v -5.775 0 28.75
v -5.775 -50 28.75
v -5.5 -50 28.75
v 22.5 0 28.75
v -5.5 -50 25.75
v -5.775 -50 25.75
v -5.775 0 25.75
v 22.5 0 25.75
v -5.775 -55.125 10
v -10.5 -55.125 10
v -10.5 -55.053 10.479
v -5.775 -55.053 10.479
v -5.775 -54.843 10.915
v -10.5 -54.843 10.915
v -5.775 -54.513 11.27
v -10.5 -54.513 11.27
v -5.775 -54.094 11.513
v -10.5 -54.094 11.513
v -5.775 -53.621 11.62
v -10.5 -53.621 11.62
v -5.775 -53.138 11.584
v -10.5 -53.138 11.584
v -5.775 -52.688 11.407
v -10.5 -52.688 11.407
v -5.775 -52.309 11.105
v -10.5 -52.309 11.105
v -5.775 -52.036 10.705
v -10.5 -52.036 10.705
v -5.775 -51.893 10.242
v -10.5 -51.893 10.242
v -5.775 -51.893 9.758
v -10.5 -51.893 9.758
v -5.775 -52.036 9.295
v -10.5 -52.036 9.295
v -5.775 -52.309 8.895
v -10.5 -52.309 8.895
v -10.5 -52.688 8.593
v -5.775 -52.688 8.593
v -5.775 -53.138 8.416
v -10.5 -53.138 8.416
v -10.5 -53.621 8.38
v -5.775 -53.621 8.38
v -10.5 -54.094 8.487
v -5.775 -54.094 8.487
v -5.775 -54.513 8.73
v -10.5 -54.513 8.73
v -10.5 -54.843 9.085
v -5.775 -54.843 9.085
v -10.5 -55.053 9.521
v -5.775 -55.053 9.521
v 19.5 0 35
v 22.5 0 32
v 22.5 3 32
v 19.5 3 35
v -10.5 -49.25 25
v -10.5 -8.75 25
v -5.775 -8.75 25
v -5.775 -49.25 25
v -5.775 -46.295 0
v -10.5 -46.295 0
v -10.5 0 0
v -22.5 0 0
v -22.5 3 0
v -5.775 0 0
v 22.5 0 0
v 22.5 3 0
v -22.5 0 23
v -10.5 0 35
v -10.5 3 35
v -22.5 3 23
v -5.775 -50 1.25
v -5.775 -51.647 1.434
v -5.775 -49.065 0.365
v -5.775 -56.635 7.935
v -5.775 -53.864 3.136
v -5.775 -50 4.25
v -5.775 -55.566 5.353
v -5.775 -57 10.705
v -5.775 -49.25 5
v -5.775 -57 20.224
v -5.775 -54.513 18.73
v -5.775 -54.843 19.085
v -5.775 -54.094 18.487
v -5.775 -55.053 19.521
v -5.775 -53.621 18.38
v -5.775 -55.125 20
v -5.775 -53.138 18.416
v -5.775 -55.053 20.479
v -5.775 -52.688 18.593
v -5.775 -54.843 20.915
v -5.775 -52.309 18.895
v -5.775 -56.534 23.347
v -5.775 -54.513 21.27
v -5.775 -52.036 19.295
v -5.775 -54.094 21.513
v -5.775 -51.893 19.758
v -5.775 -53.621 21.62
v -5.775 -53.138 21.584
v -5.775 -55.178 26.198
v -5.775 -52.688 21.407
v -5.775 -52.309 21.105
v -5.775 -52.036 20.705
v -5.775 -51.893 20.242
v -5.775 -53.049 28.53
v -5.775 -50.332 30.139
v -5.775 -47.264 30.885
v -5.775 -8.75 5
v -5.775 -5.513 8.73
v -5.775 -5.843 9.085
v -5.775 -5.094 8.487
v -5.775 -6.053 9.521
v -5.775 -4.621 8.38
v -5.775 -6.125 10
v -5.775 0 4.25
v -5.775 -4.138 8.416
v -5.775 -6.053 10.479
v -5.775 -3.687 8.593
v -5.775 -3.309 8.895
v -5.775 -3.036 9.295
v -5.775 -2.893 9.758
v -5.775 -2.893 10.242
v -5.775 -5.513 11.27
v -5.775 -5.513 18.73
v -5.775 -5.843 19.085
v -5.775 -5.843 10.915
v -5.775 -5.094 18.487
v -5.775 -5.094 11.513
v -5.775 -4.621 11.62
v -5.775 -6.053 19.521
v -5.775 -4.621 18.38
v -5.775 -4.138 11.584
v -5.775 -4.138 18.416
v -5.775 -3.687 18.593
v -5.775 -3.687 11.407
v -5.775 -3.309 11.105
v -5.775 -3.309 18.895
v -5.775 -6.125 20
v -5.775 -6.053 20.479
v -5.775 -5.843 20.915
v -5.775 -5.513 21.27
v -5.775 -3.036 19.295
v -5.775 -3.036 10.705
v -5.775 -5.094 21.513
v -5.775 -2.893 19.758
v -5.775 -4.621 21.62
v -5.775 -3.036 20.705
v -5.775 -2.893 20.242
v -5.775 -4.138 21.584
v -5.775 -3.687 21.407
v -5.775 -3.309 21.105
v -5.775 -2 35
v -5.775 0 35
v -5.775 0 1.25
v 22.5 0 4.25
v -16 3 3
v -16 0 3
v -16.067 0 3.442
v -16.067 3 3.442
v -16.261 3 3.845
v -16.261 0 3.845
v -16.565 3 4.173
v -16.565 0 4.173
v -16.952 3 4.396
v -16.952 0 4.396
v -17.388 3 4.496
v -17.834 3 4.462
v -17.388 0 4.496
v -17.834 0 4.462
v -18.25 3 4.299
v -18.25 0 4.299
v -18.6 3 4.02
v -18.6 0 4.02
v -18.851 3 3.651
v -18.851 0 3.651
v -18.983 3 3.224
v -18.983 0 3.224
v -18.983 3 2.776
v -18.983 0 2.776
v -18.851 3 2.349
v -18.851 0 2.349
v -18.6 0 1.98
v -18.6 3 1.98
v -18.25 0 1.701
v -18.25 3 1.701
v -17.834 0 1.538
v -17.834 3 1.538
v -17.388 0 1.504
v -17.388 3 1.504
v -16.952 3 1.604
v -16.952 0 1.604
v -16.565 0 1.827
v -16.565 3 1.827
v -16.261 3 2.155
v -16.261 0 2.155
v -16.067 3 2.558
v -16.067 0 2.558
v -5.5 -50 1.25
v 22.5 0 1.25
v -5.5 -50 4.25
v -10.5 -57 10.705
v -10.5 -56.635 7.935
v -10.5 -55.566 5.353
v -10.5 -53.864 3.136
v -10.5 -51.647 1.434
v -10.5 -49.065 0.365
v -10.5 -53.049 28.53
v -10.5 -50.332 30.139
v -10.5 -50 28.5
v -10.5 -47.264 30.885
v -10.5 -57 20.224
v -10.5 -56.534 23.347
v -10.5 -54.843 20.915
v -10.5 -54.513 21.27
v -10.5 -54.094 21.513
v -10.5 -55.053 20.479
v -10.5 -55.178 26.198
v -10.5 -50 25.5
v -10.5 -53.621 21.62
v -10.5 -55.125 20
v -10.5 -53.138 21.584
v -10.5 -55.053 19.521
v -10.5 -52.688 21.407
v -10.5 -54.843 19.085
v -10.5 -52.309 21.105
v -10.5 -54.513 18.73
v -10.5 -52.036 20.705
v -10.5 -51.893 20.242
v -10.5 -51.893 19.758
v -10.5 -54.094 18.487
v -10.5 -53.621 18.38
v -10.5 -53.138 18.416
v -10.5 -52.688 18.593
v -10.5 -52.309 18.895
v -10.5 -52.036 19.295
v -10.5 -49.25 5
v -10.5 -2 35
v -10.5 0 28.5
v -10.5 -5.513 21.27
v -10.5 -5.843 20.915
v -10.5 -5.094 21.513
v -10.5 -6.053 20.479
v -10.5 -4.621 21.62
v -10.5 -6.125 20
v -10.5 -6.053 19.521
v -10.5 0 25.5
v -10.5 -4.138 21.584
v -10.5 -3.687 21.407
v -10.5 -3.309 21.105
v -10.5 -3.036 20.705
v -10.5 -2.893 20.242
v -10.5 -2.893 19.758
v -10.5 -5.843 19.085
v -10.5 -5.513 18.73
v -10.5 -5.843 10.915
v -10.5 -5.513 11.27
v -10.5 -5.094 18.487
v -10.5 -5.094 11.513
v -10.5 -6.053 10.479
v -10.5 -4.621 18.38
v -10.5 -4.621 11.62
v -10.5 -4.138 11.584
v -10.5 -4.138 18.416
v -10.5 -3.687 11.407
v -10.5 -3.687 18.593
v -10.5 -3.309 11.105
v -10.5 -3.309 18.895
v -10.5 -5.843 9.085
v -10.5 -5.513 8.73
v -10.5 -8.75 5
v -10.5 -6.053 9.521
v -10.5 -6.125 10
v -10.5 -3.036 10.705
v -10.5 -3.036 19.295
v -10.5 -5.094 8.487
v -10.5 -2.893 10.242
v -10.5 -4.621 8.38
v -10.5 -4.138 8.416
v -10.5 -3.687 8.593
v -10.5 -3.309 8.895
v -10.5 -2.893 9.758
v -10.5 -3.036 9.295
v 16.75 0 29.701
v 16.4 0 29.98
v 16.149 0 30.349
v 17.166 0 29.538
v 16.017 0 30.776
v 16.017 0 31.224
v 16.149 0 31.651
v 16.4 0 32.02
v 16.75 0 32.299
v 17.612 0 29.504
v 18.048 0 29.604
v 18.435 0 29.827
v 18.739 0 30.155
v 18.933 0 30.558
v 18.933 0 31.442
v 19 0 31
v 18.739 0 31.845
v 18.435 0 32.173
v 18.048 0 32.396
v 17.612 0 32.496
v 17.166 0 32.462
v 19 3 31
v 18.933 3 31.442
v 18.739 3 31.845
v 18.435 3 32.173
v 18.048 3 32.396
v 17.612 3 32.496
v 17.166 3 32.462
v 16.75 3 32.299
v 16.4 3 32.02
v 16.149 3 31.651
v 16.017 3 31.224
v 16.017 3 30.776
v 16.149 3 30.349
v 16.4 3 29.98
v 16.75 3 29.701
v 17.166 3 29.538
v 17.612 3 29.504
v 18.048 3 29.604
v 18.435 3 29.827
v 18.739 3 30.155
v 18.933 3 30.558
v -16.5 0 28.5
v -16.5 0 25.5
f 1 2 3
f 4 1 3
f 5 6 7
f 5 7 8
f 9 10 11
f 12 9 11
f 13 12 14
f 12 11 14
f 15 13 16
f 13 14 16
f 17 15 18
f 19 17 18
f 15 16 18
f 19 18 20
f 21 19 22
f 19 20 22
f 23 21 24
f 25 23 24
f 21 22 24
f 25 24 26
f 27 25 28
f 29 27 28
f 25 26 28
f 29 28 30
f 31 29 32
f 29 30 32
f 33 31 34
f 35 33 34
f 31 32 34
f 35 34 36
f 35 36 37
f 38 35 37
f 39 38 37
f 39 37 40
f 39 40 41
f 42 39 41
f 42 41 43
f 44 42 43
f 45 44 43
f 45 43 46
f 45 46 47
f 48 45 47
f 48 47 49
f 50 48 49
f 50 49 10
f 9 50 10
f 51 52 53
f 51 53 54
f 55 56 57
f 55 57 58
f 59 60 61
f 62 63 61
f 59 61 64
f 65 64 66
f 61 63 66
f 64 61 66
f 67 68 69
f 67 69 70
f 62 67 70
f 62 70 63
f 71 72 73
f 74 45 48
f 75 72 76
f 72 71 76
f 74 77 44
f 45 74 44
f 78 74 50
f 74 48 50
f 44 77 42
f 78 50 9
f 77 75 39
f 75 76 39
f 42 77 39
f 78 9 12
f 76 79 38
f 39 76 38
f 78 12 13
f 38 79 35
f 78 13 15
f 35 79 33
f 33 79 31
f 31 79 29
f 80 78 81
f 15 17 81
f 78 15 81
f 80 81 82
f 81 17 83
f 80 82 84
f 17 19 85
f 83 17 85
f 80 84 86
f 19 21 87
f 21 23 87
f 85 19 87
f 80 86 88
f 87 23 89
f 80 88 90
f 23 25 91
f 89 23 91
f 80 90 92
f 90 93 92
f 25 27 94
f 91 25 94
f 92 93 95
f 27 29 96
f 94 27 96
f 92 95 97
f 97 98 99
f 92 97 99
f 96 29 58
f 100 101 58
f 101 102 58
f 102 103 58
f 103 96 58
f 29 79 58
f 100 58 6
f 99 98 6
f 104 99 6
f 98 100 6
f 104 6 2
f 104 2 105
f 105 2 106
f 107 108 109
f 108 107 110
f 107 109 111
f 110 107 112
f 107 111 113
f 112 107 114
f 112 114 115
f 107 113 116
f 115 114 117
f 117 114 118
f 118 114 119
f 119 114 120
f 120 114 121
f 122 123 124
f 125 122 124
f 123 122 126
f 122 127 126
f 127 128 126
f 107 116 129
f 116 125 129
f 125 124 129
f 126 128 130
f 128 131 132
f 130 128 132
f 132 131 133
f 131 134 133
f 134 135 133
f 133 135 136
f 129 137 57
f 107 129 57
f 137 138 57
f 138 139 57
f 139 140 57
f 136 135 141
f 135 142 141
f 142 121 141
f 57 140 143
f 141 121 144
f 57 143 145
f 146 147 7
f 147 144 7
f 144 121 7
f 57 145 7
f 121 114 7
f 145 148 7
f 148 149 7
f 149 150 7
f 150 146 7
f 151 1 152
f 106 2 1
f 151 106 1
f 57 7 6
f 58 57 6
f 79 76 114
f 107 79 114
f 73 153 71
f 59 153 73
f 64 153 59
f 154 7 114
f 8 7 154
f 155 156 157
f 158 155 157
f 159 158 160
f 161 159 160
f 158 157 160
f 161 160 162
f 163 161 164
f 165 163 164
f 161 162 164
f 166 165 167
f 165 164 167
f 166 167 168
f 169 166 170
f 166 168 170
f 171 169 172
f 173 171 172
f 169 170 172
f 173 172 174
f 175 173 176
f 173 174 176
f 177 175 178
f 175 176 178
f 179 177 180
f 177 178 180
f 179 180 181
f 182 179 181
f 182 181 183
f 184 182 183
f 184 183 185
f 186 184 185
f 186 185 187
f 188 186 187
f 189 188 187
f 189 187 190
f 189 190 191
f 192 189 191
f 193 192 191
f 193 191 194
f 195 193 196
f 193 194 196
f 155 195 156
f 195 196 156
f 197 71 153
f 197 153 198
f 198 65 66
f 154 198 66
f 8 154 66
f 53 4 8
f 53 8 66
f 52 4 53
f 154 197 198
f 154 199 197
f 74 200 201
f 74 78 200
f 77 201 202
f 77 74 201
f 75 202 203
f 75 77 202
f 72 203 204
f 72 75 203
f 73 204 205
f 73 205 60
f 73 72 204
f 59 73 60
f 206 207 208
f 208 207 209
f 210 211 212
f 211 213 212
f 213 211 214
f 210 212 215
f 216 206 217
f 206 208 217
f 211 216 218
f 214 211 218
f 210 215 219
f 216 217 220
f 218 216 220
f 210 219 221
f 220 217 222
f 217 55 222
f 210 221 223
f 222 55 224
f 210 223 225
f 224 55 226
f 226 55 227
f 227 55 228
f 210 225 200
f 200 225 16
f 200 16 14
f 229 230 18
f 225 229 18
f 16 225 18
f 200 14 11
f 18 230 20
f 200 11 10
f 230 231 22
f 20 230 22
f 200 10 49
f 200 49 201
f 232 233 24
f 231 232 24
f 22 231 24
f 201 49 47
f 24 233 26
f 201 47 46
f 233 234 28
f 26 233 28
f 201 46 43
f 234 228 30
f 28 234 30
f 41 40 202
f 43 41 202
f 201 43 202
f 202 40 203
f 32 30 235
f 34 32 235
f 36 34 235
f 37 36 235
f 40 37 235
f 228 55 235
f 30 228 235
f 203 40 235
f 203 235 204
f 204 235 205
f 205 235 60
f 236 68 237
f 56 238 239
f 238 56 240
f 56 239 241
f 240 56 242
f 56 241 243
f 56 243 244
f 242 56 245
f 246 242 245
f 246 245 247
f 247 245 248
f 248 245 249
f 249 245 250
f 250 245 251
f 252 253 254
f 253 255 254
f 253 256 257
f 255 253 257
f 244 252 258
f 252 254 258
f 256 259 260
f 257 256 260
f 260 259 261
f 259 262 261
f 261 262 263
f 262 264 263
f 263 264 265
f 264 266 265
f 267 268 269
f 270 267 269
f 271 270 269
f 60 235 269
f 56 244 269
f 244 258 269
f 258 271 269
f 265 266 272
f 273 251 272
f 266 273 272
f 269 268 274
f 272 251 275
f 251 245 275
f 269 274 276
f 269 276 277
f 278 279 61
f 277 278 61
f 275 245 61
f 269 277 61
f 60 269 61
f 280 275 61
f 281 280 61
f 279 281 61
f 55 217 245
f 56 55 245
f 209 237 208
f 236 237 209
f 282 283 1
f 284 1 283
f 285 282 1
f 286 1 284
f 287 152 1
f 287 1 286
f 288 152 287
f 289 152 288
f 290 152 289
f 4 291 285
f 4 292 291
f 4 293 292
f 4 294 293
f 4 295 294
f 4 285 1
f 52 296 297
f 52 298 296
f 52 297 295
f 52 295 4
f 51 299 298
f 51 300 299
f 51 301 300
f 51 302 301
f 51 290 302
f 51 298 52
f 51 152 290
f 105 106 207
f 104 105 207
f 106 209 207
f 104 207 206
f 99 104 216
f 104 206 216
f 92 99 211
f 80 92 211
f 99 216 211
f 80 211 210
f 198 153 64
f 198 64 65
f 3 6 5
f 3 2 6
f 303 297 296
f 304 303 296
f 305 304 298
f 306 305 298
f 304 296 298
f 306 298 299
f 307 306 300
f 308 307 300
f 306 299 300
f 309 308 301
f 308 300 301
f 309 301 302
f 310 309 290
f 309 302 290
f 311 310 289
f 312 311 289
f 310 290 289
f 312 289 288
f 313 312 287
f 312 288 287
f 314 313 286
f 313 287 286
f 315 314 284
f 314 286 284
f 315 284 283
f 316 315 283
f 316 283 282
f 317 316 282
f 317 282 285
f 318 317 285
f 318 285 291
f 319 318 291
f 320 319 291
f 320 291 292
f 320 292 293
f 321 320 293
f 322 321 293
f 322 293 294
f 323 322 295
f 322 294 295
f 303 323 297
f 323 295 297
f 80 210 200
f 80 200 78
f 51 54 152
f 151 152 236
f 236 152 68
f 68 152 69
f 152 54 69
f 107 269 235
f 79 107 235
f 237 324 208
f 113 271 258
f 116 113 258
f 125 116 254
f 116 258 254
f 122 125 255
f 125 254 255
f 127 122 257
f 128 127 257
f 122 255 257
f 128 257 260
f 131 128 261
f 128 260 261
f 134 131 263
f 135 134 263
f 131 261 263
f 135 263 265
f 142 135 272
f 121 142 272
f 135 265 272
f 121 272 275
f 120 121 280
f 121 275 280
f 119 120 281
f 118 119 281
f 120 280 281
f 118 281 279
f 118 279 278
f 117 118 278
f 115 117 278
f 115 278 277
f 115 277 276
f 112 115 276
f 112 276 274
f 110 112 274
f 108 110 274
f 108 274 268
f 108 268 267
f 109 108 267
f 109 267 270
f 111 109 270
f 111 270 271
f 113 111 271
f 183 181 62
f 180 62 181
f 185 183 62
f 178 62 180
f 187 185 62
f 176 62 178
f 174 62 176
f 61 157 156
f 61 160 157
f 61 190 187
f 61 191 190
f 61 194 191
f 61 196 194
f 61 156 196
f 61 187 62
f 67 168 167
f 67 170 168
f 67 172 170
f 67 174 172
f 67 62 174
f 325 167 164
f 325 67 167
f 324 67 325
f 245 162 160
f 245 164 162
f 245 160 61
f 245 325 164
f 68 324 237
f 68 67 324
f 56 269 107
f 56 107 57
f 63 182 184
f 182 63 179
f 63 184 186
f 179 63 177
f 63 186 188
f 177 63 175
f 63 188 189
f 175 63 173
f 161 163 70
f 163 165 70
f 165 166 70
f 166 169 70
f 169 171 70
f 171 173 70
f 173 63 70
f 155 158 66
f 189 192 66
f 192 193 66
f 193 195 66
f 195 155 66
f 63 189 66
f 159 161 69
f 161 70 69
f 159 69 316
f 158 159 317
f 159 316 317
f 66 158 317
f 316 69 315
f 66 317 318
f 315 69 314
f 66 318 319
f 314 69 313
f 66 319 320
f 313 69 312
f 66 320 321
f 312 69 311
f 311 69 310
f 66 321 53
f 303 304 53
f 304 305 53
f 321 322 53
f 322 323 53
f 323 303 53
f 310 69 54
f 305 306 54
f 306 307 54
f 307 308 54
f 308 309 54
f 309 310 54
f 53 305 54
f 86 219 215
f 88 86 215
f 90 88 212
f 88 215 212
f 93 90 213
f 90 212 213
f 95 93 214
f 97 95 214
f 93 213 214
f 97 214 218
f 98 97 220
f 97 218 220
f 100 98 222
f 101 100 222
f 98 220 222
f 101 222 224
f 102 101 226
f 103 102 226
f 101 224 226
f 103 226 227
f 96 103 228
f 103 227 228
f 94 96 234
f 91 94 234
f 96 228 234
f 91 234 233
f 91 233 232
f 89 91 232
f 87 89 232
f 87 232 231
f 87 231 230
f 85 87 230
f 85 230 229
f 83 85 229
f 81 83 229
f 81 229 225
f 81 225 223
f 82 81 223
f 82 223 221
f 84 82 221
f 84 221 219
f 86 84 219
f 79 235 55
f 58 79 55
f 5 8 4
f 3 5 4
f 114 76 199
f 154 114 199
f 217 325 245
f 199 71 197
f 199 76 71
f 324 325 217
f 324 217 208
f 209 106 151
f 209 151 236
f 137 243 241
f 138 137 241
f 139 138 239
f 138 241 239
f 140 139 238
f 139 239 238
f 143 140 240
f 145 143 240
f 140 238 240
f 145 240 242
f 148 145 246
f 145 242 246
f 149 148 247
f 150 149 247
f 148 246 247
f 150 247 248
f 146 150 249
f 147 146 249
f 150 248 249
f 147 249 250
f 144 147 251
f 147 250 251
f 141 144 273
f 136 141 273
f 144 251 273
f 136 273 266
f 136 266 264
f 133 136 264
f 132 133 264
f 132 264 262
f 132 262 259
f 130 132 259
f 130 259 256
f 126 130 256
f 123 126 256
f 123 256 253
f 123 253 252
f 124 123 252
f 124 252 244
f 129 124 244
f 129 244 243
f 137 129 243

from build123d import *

# Parameters (mm, degrees)
F0_R       = 1.5
F1_DEPTH   = 3
F3_DEPTH   = 57
F4_R       = 1.625
F4_W       = 40.5
F4_H       = 20
F5_DEPTH   = 33.001
F2_W       = 28.2747811079
F2_H       = 3
F6_DEPTH   = 50
F7_SIZE2   = 50
F7_SIZE    = 28
F7_2_SIZE2 = 50
F7_2_SIZE  = 28
F8_SIZE2   = 55
F8_SIZE    = 5
F9_R       = 10.70545329
F10_W      = 6
F10_H      = 3
F11_DEPTH  = 50
F12_SIZE2  = 49.99999
F12_SIZE   = 5.99999


# Not quite as in the source:
# - a fillet or chamfer is up to 0.001 mm smaller than in the source, because OpenCascade refuses the exact size


with BuildPart() as f1:
    # F0 (on Front) → F1 (new body)
    with BuildSketch(Plane.XZ):
        Polygon((-22.5, 23), (-22.5, 0), (22.5, 0), (22.5, 32), (19.5, 35), (-10.5, 35), align=None)
        with Locations((-17.5, 3)):
            Circle(F0_R, mode=Mode.SUBTRACT)
        with Locations((17.5, 31)):
            Circle(F0_R, mode=Mode.SUBTRACT)
    extrude(amount=-F1_DEPTH)

    # F2 (on face) → F3 (join)
    with BuildSketch(Plane.XZ):
        Polygon((-5.7747811079, 35), (-10.5, 35), (-10.5, 0), (-5.7747811079, 0), (-5.7747811079, 1.25), (-5.7747811079, 4.25), (-5.7747811079, 25.75), (-5.7747811079, 28.75), align=None)
    extrude(amount=F3_DEPTH)

    # F4 (on face) → F5 (cut, through all)
    with BuildSketch(Plane(origin=(-10.5, 0, 0), x_dir=(0, -1, 0), z_dir=(-1, 0, 0))):
        with Locations((4.5, 20)):
            Circle(F4_R)
        with Locations((4.5, 10)):
            Circle(F4_R)
        with Locations((29, 15)):
            Rectangle(F4_W, F4_H)
        with Locations((53.5, 20)):
            Circle(F4_R)
        with Locations((53.5, 10)):
            Circle(F4_R)
    extrude(amount=-F5_DEPTH, mode=Mode.SUBTRACT)

    # F2 (on face) → F6 (join)
    with BuildSketch(Plane.XZ):
        with Locations((8.362609446, 27.25)):
            Rectangle(F2_W, F2_H)
        with Locations((8.362609446, 2.75)):
            Rectangle(F2_W, F2_H)
    extrude(amount=F6_DEPTH)

    # F7
    f7_edges = [f1.edges().sort_by_distance(p)[0] for p in [
        (22.5, -50, 27.25),
    ]]
    f7_side = f1.faces().sort_by_distance((8.362609, -50, 27.25))[0]
    chamfer(f7_edges, length=F7_SIZE, length2=F7_SIZE2, reference=f7_side)

    # F7#2
    f7_2_edges = [f1.edges().sort_by_distance(p)[0] for p in [
        (22.5, -50, 2.75),
    ]]
    f7_2_side = f1.faces().sort_by_distance((8.362609, -50, 2.75))[0]
    chamfer(f7_2_edges, length=F7_2_SIZE, length2=F7_2_SIZE2, reference=f7_2_side)

    # F8
    f8_edges = [f1.edges().sort_by_distance(p)[0] for p in [
        (-8.137391, -57, 35),
    ]]
    chamfer(f8_edges, length=F8_SIZE, length2=F8_SIZE2)

    # F9
    f9_edges = [f1.edges().sort_by_distance(p)[0] for p in [
        (-8.137391, -57, 30),
        (-8.137391, -57, 0),
    ]]
    fillet(f9_edges, radius=F9_R)

    # F10 (on face) → F11 (join)
    with BuildSketch(Plane.XZ):
        with Locations((-13.5, 27)):
            Rectangle(F10_W, F10_H)
    extrude(amount=F11_DEPTH)

    # F12 (size 6 and 50 in the source; OpenCascade refuses exactly that, so slightly less here)
    f12_edges = [f1.edges().sort_by_distance(p)[0] for p in [
        (-16.5, -50, 27),
    ]]
    f12_side = f1.faces().sort_by_distance((-13.5, -50, 27))[0]
    chamfer(f12_edges, length=F12_SIZE, length2=F12_SIZE2, reference=f12_side)


solid = f1.part
